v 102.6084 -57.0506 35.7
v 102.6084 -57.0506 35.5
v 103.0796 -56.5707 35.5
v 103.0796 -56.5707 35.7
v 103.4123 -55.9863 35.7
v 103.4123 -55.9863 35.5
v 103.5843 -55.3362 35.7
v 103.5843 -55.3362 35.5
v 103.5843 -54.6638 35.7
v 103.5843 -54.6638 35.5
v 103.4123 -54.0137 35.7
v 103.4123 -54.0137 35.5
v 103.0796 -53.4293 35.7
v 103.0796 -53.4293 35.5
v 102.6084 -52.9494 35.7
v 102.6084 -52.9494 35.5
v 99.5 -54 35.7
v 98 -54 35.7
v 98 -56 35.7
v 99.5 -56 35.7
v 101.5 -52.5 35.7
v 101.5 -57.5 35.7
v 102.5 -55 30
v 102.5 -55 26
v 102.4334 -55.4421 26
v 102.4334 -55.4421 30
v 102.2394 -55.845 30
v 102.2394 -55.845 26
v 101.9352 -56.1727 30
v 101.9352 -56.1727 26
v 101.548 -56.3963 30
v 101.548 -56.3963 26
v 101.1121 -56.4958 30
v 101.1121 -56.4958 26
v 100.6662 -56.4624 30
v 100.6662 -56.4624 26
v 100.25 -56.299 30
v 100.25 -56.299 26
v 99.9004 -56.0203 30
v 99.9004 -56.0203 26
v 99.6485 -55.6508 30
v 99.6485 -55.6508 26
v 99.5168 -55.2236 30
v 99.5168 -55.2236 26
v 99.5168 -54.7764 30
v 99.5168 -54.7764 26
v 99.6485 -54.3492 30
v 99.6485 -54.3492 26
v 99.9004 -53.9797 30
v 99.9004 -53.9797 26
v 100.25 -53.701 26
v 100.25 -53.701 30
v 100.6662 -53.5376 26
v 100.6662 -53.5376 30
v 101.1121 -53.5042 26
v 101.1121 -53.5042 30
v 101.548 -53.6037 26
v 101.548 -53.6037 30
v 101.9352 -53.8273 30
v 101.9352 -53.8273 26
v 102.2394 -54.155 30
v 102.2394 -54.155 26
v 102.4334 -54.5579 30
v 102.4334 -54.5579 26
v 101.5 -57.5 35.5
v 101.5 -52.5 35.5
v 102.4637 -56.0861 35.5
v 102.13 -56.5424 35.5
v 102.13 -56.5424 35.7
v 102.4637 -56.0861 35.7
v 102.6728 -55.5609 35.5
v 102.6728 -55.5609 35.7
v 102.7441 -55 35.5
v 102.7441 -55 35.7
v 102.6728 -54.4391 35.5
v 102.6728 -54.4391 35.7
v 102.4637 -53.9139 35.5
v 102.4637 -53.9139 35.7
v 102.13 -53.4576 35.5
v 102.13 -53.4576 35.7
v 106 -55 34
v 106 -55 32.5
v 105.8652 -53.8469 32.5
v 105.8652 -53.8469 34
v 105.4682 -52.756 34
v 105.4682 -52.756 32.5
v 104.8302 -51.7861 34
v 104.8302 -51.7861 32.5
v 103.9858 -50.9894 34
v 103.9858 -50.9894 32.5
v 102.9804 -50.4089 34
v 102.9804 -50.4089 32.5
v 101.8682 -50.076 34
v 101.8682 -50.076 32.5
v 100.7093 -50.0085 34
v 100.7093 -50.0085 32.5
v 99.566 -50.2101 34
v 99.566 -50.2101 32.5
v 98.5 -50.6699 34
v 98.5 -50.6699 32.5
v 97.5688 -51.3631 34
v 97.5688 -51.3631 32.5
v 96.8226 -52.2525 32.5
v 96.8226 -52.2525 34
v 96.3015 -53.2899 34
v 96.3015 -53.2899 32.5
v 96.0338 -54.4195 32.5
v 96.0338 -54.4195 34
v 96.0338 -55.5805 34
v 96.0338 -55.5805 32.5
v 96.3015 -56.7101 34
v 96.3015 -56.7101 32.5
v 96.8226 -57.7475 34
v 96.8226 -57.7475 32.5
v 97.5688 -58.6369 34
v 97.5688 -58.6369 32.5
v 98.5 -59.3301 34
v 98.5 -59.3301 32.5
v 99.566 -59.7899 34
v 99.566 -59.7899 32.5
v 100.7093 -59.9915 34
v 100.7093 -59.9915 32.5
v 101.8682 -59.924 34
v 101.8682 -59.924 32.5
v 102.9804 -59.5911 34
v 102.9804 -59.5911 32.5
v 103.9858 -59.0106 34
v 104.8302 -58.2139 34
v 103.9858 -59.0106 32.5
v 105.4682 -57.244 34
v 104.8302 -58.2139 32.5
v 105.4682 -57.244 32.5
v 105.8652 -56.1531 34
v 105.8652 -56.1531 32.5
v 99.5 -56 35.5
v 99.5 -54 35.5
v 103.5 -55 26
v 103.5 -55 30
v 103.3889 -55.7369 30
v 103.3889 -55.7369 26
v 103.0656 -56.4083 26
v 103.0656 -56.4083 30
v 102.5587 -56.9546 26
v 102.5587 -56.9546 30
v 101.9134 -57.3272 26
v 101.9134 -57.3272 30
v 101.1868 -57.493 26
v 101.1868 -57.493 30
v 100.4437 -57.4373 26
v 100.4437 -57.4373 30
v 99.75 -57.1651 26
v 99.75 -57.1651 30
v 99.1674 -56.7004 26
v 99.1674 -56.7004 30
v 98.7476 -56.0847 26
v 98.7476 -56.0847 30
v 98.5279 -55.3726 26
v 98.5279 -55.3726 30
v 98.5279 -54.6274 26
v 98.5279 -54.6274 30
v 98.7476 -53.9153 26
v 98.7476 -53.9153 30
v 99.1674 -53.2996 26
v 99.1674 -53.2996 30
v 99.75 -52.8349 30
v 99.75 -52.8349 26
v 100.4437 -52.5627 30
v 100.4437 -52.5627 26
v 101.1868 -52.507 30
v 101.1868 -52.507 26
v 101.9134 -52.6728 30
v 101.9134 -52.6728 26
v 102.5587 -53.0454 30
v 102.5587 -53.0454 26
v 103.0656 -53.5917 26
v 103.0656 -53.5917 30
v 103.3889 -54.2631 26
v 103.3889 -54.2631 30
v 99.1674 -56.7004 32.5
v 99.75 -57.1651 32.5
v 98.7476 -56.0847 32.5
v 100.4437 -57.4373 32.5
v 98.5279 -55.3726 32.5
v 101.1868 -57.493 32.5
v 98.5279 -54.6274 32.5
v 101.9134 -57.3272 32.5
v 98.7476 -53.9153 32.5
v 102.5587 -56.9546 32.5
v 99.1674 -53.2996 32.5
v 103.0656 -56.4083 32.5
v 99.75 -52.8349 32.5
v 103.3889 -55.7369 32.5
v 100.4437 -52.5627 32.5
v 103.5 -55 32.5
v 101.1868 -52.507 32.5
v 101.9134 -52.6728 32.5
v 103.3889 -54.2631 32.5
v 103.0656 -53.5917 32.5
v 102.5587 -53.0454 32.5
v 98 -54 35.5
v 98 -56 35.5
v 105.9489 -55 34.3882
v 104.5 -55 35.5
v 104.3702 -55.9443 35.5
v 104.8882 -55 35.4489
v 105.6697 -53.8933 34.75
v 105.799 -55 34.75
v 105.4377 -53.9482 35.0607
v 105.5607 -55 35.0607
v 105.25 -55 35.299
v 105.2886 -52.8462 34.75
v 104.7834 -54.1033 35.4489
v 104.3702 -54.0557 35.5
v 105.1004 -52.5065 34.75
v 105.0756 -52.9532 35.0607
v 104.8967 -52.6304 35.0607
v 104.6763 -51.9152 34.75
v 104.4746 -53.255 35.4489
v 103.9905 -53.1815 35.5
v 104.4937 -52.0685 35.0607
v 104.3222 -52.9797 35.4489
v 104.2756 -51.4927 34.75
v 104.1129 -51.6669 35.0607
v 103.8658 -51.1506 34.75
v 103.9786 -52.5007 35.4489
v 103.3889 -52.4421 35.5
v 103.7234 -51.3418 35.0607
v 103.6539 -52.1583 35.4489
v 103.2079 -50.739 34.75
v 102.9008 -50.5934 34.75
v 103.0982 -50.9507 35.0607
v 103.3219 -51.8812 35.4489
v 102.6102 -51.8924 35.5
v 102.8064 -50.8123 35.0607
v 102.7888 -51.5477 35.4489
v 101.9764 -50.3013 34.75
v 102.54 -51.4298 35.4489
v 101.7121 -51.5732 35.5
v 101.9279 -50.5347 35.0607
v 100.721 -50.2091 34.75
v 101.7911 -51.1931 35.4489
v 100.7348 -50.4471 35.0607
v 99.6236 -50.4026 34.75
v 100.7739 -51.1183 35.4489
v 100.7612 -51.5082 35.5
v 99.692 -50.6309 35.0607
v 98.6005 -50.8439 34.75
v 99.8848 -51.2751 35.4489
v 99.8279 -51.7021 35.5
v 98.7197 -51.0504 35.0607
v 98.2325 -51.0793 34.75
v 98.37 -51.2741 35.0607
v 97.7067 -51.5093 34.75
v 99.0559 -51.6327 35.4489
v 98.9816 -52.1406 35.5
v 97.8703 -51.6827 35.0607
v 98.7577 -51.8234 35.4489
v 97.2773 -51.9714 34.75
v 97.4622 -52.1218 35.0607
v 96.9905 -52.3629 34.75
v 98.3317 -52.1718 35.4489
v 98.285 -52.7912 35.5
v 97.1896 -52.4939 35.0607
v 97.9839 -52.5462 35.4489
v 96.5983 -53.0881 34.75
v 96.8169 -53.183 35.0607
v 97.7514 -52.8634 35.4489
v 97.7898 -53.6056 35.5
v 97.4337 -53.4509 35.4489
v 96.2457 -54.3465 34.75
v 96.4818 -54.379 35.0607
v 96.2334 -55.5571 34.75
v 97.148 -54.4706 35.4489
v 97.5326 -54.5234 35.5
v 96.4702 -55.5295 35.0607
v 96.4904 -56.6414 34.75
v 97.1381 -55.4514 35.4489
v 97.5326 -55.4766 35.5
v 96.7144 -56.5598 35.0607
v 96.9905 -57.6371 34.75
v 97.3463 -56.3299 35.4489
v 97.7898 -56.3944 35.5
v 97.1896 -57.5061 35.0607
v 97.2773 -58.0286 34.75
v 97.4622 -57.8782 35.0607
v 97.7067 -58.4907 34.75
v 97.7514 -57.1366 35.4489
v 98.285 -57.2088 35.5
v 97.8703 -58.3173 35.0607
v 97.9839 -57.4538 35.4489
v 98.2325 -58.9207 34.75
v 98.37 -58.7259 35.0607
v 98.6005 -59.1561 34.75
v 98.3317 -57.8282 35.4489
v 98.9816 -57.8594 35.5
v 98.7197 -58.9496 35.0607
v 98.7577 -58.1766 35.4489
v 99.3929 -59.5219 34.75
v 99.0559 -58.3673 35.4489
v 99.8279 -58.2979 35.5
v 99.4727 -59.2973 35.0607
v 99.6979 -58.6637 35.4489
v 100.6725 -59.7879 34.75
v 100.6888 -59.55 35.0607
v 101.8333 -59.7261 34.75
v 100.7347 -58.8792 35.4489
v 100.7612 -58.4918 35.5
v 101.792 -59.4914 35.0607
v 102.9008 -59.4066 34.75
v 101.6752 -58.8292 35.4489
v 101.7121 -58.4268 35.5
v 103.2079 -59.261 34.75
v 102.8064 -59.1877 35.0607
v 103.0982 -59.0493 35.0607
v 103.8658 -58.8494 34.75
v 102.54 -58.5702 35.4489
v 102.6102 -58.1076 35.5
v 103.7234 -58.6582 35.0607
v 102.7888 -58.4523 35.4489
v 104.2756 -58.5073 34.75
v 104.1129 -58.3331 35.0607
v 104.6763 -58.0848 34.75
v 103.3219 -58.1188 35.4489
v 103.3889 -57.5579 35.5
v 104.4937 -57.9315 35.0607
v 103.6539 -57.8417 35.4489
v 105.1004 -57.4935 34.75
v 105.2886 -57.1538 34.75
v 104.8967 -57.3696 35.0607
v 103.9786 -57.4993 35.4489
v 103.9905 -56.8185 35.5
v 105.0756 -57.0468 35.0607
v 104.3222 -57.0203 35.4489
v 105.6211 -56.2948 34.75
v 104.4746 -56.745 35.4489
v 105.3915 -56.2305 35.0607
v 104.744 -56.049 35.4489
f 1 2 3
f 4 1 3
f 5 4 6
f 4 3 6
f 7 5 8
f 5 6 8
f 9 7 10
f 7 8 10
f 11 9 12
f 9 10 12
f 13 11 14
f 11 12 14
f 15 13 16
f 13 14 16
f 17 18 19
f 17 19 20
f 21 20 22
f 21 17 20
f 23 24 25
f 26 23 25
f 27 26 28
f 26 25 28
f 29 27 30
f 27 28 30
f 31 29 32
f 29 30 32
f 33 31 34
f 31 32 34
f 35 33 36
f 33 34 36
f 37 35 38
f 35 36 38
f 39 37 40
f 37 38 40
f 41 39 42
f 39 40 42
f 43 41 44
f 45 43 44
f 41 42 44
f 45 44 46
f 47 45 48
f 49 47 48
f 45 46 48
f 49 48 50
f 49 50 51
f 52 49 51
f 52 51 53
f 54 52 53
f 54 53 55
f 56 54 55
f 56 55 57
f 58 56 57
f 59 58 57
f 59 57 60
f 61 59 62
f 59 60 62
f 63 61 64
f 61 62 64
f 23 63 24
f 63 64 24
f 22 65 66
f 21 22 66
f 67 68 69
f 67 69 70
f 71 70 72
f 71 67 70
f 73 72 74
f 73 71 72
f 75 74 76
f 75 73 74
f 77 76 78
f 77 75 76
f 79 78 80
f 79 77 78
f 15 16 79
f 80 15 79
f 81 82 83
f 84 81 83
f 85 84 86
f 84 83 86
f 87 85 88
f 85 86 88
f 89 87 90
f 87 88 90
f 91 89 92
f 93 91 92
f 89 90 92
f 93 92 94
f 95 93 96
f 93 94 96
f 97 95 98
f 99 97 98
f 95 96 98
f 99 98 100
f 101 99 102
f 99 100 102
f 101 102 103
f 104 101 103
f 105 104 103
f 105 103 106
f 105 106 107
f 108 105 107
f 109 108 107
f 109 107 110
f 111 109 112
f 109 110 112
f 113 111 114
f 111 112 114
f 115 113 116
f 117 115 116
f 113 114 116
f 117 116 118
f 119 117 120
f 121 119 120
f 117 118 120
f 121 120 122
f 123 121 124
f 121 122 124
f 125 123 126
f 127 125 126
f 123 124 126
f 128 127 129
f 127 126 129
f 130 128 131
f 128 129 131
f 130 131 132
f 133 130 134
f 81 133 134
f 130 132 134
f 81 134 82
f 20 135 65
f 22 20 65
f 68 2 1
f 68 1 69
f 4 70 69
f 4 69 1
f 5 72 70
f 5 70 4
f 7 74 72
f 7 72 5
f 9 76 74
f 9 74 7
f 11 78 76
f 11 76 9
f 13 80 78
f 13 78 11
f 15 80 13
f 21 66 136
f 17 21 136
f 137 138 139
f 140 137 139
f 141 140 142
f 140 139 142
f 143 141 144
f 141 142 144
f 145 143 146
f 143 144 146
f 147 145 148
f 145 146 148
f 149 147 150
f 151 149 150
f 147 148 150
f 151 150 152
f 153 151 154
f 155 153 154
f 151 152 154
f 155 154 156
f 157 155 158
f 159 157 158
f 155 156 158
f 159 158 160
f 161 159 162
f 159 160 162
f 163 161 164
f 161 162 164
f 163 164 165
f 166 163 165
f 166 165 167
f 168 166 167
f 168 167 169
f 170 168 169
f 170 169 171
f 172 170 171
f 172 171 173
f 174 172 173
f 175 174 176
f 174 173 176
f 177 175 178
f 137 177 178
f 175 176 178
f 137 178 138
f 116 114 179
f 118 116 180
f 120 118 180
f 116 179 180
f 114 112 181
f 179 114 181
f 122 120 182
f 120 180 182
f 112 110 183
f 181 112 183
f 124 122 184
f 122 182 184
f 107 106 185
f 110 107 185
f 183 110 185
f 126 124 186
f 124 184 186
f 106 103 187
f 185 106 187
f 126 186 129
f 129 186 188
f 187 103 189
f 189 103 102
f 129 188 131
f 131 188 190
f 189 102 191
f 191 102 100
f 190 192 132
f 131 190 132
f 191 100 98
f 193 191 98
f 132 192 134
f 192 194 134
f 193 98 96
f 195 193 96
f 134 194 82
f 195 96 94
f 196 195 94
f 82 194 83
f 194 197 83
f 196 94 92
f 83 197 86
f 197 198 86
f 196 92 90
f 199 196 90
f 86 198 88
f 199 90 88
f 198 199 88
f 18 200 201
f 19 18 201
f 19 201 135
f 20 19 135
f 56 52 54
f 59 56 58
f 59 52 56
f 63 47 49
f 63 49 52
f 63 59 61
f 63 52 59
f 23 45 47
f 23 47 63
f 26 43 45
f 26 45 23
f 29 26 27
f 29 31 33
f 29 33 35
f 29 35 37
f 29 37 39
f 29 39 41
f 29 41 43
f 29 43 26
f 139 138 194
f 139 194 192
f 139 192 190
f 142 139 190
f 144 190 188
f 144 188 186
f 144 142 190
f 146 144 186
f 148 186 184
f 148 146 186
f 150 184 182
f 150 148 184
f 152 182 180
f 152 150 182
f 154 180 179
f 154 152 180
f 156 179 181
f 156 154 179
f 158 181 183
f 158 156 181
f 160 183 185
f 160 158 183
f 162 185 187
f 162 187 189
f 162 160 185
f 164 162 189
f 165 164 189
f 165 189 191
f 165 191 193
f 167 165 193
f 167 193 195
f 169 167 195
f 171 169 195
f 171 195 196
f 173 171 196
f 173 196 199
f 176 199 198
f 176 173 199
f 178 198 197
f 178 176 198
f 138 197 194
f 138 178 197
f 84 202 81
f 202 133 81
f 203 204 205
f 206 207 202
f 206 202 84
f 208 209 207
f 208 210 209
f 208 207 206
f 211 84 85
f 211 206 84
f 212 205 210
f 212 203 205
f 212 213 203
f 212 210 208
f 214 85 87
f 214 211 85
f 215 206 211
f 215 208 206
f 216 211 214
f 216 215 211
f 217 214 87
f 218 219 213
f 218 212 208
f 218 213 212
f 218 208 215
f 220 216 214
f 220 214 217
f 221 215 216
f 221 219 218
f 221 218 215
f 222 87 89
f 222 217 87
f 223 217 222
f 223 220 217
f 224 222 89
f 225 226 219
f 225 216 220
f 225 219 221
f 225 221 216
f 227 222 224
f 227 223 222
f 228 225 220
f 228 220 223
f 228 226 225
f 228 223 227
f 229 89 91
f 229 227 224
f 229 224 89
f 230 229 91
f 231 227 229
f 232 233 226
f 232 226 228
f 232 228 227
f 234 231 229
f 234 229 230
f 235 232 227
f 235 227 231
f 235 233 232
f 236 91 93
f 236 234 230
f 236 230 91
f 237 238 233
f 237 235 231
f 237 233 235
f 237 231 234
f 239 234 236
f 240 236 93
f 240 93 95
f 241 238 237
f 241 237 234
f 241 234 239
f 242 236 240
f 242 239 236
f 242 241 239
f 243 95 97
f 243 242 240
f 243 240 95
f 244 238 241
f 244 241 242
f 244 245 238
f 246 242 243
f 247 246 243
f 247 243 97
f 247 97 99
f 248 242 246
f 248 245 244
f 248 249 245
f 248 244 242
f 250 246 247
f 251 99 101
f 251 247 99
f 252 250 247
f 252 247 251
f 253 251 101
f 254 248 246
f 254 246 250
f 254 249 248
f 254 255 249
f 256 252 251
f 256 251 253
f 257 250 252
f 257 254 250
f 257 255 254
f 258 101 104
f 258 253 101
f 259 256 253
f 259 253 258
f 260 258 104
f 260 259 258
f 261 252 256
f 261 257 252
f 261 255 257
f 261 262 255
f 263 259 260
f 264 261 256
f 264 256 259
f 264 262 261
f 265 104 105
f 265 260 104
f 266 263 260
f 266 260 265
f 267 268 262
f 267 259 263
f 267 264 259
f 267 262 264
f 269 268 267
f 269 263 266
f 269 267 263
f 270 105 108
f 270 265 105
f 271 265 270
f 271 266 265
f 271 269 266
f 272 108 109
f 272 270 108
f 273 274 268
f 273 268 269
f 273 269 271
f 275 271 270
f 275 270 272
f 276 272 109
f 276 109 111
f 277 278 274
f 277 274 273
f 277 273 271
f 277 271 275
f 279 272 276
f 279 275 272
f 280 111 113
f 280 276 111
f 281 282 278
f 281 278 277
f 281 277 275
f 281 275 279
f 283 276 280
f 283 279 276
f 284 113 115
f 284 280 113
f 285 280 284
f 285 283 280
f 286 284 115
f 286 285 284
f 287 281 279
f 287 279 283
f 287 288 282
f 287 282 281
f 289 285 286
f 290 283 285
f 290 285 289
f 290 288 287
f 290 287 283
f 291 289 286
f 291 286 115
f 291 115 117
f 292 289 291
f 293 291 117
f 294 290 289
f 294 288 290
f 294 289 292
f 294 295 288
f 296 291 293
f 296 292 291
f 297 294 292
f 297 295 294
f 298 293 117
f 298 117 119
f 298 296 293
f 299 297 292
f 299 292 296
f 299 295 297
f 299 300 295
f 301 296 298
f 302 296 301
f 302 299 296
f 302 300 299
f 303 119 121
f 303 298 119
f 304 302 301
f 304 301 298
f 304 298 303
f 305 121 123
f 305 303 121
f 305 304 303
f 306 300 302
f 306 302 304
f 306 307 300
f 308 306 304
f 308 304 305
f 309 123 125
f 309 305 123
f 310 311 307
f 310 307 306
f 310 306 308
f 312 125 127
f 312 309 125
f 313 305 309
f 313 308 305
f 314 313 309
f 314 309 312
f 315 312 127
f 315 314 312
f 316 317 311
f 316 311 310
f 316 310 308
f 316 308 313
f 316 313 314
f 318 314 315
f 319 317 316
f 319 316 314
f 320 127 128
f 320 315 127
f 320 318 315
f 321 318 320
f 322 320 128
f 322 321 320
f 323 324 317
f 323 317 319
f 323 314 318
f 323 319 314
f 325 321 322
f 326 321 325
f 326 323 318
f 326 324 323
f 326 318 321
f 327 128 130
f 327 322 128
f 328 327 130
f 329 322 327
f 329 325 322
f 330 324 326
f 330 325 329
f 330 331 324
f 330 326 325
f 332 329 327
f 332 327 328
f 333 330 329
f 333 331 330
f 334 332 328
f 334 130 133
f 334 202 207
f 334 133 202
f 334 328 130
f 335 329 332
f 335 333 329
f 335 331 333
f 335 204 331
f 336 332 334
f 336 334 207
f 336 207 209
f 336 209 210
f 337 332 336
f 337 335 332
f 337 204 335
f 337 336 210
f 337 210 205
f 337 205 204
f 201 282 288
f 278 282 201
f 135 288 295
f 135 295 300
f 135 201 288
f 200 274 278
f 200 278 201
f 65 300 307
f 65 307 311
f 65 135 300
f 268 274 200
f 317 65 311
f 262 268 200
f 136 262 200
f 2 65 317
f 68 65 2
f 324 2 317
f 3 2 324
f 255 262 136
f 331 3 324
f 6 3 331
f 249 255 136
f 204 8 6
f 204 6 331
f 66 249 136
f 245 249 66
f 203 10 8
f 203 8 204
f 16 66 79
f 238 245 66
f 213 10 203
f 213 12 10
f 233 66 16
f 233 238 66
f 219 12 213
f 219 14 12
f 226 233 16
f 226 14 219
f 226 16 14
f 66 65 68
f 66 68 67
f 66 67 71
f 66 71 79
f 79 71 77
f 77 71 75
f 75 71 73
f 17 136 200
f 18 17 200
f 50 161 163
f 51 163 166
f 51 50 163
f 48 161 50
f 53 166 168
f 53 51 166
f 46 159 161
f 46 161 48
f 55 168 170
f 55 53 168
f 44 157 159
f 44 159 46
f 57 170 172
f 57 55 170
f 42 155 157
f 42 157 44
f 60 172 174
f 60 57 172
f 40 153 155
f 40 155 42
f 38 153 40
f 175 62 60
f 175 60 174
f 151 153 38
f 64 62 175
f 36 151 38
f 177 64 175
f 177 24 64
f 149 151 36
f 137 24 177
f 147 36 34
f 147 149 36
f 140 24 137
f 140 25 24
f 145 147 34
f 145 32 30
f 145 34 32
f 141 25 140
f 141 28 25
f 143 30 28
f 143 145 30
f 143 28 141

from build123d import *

# Parameters (mm, degrees)
SKETCH046_R     = 2.5
PAD023_DEPTH    = 2.5
SKETCH047_R     = 5
PAD024_DEPTH    = 3
FILLET003_R     = 1.5
SKETCH049_R     = 2.5
PAD025_DEPTH    = 4
SKETCH050_R     = 1.5
POCKET026_DEPTH = 4
PAD055_DEPTH    = 0.2


with BuildPart() as part:
    # Sketch046 → Pad023 (new body)
    with BuildSketch(Plane(origin=(0, 0, 30), x_dir=(1, 0, 0), z_dir=(0, 0, -1))):
        with Locations((101, 55)):
            Circle(SKETCH046_R)
    extrude(amount=-PAD023_DEPTH)

    # Sketch047 (on Face3 of Pad023) → Pad024 (join)
    with BuildSketch(Plane.XY.offset(32.5)):
        with Locations((101, -55)):
            Circle(SKETCH047_R)
    extrude(amount=PAD024_DEPTH)

    # Fillet003
    fillet003_edges = [part.edges().sort_by_distance(p)[0] for p in [
        (96, -55, 35.5),
    ]]
    fillet(fillet003_edges, radius=FILLET003_R)

    # Sketch049 → Pad025 (join)
    with BuildSketch(Plane(origin=(0, 0, 30), x_dir=(1, 0, 0), z_dir=(0, 0, -1))):
        with Locations((101, 55)):
            Circle(SKETCH049_R)
    extrude(amount=PAD025_DEPTH)

    # Sketch050 (on Face17 of Pad025) → Pocket026 (cut)
    with BuildSketch(Plane(origin=(0, 0, 26), x_dir=(1, 0, 0), z_dir=(0, 0, -1))):
        with Locations((101, 55)):
            Circle(SKETCH050_R)
    extrude(amount=-POCKET026_DEPTH, mode=Mode.SUBTRACT)


with BuildPart() as part_1:
    # Body002 placement: moved
    add(part.part.moved(Location((75, 0, 0))))

    # Sketch089 (on Face4 of Clone) → Pad055 (new body)
    with BuildSketch(Plane(origin=(176, -55, 35.5), x_dir=(1, 0, 0), z_dir=(0, 0, 1))):
        Polygon((-3, 1), (-3, -1), (-1.5, -1), (0.5, -2.5), (0.5, 2.5), (-1.5, 1), align=None)
        with BuildLine():
            ThreePointArc((1.608436, -2.050571), (2.606129, 0), (1.608436, 2.050571))
            Line((1.608436, 2.050571), (1.129955, 1.542421))
            ThreePointArc((1.129955, -1.542421), (1.744062, 0), (1.129955, 1.542421))
            Line((1.608436, -2.050571), (1.129955, -1.542421))
        make_face()
    extrude(amount=PAD055_DEPTH)


with BuildPart() as part_2:
    # Body012 placement: moved
    add(part_1.part.moved(Location((-75, 0, 0))))


solid = part_2.part
